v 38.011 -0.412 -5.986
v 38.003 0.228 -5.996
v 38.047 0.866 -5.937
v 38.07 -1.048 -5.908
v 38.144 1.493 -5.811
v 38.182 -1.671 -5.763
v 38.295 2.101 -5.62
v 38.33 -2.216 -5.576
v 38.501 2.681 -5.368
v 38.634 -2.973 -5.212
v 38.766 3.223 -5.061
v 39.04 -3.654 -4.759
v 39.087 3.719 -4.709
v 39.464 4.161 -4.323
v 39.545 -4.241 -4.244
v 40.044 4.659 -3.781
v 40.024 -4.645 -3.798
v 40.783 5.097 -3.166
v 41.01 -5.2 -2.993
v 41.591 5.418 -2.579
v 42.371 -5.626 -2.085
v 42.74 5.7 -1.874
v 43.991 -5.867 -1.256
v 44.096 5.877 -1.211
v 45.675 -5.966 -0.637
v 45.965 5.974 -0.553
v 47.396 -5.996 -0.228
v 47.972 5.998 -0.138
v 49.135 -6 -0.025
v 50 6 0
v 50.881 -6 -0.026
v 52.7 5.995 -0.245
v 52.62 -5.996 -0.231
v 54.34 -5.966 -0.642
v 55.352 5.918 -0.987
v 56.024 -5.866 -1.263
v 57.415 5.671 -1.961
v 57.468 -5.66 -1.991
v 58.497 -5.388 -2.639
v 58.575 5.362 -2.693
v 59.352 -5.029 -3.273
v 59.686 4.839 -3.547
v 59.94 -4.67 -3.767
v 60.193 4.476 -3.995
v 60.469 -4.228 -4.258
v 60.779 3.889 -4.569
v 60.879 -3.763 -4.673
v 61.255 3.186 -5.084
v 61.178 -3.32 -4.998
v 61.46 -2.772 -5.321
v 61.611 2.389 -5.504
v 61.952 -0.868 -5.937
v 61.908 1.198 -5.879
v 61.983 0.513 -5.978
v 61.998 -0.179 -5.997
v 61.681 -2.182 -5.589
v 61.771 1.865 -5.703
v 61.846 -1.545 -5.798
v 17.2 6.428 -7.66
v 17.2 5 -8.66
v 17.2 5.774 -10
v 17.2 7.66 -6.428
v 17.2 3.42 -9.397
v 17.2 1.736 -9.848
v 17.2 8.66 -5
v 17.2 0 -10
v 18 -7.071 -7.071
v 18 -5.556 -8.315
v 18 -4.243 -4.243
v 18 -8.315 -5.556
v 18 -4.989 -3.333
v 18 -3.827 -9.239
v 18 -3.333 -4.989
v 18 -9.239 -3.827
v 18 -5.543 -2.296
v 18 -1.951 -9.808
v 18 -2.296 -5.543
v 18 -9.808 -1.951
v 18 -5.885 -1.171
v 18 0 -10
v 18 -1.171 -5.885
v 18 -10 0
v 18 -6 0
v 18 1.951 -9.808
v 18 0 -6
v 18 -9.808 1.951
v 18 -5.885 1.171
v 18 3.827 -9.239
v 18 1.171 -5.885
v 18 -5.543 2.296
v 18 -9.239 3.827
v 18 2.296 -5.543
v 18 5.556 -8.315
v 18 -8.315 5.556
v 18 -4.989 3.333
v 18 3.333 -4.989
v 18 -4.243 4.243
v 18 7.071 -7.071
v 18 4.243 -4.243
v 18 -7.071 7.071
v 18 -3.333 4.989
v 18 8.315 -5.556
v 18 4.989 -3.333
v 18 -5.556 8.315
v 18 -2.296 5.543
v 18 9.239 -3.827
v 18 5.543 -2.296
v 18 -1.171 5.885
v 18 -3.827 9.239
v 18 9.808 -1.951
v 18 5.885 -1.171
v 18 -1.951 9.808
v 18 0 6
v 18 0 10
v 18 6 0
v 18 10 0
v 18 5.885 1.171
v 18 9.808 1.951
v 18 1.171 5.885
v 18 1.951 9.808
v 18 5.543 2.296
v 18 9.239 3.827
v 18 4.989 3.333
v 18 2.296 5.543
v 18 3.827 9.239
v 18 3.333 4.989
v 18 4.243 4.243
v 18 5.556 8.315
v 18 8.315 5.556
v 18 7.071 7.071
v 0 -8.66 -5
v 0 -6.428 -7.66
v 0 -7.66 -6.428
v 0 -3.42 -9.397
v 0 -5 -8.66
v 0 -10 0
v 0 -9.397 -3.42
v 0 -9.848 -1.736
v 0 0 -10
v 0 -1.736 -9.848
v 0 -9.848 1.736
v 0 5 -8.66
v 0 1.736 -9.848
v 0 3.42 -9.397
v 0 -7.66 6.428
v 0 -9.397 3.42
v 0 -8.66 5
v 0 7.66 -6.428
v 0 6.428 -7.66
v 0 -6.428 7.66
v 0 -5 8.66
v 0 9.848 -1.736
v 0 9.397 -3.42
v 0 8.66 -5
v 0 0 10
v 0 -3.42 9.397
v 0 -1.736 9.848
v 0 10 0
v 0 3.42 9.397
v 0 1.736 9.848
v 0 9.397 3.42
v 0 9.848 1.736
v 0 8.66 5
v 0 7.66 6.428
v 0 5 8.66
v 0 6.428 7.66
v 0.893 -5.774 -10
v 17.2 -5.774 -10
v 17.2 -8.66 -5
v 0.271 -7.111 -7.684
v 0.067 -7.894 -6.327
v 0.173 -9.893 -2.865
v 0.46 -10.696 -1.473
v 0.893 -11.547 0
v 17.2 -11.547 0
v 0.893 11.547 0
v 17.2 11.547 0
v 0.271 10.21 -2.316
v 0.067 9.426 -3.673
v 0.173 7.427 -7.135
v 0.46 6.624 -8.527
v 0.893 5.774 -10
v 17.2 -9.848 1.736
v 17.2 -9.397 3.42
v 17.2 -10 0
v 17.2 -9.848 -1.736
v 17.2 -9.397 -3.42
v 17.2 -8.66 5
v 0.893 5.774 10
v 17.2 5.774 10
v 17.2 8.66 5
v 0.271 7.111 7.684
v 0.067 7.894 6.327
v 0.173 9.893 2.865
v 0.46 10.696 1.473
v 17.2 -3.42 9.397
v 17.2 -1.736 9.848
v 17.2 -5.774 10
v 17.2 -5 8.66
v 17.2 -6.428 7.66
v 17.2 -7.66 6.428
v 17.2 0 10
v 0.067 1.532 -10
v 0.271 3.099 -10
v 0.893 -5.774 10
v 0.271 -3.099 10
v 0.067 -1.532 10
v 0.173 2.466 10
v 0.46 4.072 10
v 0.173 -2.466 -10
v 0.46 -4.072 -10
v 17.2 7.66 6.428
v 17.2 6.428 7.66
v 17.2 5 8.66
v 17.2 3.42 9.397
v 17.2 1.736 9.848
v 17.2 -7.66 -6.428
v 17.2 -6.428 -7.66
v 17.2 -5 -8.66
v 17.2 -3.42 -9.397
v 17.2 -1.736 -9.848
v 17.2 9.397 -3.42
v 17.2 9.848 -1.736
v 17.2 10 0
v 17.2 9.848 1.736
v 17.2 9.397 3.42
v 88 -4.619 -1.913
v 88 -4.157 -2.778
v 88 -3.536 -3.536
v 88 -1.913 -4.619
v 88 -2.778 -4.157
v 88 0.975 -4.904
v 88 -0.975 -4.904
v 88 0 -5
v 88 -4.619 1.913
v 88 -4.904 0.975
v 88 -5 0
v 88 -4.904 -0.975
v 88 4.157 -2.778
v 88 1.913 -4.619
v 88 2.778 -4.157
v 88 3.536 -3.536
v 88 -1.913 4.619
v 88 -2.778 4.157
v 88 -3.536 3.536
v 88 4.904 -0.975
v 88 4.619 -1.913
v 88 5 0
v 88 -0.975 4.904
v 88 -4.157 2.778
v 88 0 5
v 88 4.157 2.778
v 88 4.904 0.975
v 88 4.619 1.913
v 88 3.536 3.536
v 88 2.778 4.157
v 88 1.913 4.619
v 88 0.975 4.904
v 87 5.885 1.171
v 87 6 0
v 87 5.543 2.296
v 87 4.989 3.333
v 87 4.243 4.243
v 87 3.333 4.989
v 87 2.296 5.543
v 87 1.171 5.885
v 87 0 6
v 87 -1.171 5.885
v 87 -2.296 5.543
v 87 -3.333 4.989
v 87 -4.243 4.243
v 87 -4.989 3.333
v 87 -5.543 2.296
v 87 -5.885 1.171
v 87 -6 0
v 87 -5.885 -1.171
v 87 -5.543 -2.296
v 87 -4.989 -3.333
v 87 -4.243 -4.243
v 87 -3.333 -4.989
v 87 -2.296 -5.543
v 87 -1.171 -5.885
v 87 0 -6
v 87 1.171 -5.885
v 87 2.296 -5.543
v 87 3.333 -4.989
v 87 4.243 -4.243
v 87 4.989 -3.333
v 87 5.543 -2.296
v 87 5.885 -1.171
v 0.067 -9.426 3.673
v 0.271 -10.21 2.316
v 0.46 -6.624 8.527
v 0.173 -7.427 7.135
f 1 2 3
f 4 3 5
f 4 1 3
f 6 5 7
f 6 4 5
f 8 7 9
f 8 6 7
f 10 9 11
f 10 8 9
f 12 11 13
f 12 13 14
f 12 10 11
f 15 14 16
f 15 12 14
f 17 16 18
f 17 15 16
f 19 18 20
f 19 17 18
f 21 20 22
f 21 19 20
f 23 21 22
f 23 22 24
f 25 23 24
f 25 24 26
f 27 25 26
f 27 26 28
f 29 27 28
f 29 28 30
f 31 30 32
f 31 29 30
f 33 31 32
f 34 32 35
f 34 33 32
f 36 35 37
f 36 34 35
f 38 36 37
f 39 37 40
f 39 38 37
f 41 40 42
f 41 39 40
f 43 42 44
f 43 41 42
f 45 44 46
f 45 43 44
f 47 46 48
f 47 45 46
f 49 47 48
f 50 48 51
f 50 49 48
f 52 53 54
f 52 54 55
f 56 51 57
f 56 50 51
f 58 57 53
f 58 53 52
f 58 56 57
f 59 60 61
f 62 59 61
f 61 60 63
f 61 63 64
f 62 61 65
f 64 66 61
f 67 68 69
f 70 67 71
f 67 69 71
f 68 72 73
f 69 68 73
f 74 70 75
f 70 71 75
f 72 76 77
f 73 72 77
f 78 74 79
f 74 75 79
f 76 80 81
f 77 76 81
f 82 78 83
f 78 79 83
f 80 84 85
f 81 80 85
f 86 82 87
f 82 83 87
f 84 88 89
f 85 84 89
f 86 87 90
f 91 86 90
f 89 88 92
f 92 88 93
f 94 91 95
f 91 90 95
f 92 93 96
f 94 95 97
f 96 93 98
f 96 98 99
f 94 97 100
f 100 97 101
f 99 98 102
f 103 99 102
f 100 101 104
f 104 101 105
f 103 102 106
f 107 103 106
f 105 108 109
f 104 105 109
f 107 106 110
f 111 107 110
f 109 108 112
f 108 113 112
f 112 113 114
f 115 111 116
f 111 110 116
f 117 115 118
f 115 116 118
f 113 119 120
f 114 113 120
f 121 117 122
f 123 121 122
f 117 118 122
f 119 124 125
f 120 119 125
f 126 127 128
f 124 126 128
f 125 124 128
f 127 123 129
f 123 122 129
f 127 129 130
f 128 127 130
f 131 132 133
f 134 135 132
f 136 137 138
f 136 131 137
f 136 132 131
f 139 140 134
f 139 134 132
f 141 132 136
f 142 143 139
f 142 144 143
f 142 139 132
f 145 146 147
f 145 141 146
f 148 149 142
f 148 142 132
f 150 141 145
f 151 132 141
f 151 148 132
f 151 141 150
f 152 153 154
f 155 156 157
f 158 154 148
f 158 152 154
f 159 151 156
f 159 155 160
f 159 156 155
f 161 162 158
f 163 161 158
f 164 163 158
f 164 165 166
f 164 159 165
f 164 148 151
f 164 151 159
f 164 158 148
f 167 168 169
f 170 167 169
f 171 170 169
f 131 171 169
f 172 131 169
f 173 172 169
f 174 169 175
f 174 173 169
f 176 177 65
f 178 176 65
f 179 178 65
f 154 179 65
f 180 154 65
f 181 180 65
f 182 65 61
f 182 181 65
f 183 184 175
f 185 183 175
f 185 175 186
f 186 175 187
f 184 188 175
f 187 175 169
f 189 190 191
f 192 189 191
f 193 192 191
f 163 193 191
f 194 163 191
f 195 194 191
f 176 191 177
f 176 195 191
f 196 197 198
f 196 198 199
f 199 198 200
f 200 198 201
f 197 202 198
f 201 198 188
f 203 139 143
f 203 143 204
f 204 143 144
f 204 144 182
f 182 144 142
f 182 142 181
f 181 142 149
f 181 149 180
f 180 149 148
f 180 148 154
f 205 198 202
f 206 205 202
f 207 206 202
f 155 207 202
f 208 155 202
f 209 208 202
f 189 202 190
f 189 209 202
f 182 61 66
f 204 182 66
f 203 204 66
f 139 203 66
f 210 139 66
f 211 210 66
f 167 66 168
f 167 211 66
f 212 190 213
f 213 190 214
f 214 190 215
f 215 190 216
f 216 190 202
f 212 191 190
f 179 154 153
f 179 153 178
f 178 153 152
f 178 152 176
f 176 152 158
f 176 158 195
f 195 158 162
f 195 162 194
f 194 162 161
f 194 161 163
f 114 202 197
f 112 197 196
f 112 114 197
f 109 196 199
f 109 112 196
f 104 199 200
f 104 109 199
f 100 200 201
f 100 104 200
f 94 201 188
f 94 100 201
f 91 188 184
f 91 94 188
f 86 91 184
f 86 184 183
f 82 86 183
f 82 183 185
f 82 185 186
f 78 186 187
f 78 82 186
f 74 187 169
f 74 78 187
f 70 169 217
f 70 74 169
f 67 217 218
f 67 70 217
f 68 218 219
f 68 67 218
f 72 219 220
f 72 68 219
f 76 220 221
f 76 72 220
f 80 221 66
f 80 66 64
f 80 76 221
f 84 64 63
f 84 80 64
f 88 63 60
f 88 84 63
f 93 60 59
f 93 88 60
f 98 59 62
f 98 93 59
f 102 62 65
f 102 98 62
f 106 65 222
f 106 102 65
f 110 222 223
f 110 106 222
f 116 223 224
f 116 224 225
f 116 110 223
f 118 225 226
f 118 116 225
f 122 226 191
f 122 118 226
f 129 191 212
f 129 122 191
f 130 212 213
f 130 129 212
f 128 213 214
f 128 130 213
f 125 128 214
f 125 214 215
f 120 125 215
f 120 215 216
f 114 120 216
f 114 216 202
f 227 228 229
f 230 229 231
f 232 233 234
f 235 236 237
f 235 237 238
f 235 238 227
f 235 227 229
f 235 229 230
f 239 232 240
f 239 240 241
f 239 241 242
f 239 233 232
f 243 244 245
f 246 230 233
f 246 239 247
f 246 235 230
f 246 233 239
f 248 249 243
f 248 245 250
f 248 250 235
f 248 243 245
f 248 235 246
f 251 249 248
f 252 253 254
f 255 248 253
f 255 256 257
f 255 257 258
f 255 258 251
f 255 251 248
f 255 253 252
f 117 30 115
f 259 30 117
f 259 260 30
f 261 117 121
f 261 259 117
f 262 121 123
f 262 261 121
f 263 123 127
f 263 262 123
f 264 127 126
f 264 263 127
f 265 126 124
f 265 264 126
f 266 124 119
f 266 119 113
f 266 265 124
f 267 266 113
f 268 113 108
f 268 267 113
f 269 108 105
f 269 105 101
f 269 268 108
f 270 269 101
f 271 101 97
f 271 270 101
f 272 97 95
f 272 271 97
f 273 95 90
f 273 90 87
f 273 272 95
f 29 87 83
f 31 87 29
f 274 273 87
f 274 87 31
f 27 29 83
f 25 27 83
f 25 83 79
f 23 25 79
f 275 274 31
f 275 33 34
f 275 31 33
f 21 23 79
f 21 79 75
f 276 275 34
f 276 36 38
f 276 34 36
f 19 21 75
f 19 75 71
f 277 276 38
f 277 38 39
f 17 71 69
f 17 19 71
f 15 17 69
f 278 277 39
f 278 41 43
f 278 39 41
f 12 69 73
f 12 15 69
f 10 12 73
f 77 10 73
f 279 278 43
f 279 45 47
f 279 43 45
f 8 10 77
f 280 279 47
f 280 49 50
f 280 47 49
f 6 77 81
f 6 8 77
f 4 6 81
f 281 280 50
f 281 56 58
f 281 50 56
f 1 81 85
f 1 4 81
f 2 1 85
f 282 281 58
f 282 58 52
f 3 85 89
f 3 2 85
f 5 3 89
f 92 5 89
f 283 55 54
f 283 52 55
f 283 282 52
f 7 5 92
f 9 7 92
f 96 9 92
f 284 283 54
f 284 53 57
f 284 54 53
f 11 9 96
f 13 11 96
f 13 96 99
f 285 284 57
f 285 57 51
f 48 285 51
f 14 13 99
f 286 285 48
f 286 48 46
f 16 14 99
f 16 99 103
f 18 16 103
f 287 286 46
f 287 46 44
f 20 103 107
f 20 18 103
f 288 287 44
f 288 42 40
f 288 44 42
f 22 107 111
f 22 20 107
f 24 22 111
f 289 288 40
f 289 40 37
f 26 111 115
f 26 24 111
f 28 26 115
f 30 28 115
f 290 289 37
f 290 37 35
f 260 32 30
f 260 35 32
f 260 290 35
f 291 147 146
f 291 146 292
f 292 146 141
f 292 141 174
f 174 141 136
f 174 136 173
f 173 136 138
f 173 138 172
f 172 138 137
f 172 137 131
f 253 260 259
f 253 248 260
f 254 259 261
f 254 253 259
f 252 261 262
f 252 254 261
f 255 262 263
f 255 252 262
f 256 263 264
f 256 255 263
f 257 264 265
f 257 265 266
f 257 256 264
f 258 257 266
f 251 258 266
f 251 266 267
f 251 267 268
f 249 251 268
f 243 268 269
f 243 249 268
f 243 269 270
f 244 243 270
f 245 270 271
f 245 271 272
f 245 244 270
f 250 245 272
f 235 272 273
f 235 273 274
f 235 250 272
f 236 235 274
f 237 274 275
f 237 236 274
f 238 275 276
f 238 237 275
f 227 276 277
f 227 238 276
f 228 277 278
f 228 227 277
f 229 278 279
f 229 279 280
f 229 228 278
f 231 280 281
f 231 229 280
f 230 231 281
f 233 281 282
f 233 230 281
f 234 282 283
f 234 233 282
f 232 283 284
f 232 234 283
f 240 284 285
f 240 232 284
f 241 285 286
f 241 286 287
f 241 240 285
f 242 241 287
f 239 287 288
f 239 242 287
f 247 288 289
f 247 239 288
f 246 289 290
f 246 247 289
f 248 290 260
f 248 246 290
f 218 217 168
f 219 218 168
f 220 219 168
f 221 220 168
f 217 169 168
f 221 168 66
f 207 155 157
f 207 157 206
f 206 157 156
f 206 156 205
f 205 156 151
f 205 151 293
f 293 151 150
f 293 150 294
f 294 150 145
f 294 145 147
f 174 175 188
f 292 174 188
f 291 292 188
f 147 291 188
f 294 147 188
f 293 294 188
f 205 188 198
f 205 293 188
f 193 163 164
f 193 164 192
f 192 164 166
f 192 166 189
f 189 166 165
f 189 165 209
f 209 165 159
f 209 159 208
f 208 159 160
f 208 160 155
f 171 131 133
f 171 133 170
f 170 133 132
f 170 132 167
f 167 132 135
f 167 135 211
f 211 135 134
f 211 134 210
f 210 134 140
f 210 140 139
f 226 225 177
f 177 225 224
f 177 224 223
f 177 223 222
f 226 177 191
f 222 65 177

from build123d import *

# Parameters (mm, degrees)
BASEHEAD_DEPTH          = 18
SKETCH4_W               = 0.8
SKETCH4_H               = 11.547005384
CUT_EXTRUDE1_DEPTH      = 90.315918702
CUT_EXTRUDE1_DEPTH_BACK = 90.315918702
SKETCH6_R               = 15


# Read off the part's stored shape, not the designer's step: HeadChamfer
with BuildPart() as part:
    # Sketch1 → BaseHead (new body)
    with BuildSketch(Plane(origin=(0, 0, 0), x_dir=(0, 0, -1), z_dir=(1, 0, 0))):
        Polygon((10, 5.773502692), (10, -5.773502692), (0, -11.547005384), (-10, -5.773502692), (-10, 5.773502692), (0, 11.547005384), align=None)
    extrude(amount=BASEHEAD_DEPTH)

    # HeadChamfer outline → HeadChamfer (revolve, cut)
    with BuildSketch(Plane.YX):
        Polygon((11.547005388, 0.893163977), (10, 0), (11.547005388, 0), align=None)
    revolve(axis=Axis((0, 0, 0), (1, 0, 0)), mode=Mode.SUBTRACT)

    # HeadChamfer 2 outline → HeadChamfer 2 (revolve)
    with BuildSketch(Plane.YX):
        Polygon((6, 18), (6, 87), (5, 88), (0, 88), (0, 18), align=None)
    revolve(axis=Axis((0, 0, 0), (1, 0, 0)))

    # Sketch4 → BearingFace (revolve, cut)
    with BuildSketch(Plane.XY, mode=Mode.PRIVATE) as bearingface_sk:
        with Locations((17.6, 15.773502692)):
            Rectangle(SKETCH4_W, SKETCH4_H)
    revolve(bearingface_sk.sketch.rotate(Axis((0, 0, 0), (1, 0, 0)), 90), axis=Axis((0, 0, 0), (1, 0, 0)), mode=Mode.SUBTRACT)

    # Sketch6 → Cut-Extrude1 (cut, two sides: drawn at the far end of the back side and taken through both)
    with BuildSketch(Plane(origin=(0, 0, 0), x_dir=(1, 0, 0), z_dir=(0, 1, 0)).offset(-CUT_EXTRUDE1_DEPTH_BACK)):
        with Locations((50, 15)):
            Circle(SKETCH6_R)
    extrude(amount=CUT_EXTRUDE1_DEPTH + CUT_EXTRUDE1_DEPTH_BACK, mode=Mode.SUBTRACT)


solid = part.part
